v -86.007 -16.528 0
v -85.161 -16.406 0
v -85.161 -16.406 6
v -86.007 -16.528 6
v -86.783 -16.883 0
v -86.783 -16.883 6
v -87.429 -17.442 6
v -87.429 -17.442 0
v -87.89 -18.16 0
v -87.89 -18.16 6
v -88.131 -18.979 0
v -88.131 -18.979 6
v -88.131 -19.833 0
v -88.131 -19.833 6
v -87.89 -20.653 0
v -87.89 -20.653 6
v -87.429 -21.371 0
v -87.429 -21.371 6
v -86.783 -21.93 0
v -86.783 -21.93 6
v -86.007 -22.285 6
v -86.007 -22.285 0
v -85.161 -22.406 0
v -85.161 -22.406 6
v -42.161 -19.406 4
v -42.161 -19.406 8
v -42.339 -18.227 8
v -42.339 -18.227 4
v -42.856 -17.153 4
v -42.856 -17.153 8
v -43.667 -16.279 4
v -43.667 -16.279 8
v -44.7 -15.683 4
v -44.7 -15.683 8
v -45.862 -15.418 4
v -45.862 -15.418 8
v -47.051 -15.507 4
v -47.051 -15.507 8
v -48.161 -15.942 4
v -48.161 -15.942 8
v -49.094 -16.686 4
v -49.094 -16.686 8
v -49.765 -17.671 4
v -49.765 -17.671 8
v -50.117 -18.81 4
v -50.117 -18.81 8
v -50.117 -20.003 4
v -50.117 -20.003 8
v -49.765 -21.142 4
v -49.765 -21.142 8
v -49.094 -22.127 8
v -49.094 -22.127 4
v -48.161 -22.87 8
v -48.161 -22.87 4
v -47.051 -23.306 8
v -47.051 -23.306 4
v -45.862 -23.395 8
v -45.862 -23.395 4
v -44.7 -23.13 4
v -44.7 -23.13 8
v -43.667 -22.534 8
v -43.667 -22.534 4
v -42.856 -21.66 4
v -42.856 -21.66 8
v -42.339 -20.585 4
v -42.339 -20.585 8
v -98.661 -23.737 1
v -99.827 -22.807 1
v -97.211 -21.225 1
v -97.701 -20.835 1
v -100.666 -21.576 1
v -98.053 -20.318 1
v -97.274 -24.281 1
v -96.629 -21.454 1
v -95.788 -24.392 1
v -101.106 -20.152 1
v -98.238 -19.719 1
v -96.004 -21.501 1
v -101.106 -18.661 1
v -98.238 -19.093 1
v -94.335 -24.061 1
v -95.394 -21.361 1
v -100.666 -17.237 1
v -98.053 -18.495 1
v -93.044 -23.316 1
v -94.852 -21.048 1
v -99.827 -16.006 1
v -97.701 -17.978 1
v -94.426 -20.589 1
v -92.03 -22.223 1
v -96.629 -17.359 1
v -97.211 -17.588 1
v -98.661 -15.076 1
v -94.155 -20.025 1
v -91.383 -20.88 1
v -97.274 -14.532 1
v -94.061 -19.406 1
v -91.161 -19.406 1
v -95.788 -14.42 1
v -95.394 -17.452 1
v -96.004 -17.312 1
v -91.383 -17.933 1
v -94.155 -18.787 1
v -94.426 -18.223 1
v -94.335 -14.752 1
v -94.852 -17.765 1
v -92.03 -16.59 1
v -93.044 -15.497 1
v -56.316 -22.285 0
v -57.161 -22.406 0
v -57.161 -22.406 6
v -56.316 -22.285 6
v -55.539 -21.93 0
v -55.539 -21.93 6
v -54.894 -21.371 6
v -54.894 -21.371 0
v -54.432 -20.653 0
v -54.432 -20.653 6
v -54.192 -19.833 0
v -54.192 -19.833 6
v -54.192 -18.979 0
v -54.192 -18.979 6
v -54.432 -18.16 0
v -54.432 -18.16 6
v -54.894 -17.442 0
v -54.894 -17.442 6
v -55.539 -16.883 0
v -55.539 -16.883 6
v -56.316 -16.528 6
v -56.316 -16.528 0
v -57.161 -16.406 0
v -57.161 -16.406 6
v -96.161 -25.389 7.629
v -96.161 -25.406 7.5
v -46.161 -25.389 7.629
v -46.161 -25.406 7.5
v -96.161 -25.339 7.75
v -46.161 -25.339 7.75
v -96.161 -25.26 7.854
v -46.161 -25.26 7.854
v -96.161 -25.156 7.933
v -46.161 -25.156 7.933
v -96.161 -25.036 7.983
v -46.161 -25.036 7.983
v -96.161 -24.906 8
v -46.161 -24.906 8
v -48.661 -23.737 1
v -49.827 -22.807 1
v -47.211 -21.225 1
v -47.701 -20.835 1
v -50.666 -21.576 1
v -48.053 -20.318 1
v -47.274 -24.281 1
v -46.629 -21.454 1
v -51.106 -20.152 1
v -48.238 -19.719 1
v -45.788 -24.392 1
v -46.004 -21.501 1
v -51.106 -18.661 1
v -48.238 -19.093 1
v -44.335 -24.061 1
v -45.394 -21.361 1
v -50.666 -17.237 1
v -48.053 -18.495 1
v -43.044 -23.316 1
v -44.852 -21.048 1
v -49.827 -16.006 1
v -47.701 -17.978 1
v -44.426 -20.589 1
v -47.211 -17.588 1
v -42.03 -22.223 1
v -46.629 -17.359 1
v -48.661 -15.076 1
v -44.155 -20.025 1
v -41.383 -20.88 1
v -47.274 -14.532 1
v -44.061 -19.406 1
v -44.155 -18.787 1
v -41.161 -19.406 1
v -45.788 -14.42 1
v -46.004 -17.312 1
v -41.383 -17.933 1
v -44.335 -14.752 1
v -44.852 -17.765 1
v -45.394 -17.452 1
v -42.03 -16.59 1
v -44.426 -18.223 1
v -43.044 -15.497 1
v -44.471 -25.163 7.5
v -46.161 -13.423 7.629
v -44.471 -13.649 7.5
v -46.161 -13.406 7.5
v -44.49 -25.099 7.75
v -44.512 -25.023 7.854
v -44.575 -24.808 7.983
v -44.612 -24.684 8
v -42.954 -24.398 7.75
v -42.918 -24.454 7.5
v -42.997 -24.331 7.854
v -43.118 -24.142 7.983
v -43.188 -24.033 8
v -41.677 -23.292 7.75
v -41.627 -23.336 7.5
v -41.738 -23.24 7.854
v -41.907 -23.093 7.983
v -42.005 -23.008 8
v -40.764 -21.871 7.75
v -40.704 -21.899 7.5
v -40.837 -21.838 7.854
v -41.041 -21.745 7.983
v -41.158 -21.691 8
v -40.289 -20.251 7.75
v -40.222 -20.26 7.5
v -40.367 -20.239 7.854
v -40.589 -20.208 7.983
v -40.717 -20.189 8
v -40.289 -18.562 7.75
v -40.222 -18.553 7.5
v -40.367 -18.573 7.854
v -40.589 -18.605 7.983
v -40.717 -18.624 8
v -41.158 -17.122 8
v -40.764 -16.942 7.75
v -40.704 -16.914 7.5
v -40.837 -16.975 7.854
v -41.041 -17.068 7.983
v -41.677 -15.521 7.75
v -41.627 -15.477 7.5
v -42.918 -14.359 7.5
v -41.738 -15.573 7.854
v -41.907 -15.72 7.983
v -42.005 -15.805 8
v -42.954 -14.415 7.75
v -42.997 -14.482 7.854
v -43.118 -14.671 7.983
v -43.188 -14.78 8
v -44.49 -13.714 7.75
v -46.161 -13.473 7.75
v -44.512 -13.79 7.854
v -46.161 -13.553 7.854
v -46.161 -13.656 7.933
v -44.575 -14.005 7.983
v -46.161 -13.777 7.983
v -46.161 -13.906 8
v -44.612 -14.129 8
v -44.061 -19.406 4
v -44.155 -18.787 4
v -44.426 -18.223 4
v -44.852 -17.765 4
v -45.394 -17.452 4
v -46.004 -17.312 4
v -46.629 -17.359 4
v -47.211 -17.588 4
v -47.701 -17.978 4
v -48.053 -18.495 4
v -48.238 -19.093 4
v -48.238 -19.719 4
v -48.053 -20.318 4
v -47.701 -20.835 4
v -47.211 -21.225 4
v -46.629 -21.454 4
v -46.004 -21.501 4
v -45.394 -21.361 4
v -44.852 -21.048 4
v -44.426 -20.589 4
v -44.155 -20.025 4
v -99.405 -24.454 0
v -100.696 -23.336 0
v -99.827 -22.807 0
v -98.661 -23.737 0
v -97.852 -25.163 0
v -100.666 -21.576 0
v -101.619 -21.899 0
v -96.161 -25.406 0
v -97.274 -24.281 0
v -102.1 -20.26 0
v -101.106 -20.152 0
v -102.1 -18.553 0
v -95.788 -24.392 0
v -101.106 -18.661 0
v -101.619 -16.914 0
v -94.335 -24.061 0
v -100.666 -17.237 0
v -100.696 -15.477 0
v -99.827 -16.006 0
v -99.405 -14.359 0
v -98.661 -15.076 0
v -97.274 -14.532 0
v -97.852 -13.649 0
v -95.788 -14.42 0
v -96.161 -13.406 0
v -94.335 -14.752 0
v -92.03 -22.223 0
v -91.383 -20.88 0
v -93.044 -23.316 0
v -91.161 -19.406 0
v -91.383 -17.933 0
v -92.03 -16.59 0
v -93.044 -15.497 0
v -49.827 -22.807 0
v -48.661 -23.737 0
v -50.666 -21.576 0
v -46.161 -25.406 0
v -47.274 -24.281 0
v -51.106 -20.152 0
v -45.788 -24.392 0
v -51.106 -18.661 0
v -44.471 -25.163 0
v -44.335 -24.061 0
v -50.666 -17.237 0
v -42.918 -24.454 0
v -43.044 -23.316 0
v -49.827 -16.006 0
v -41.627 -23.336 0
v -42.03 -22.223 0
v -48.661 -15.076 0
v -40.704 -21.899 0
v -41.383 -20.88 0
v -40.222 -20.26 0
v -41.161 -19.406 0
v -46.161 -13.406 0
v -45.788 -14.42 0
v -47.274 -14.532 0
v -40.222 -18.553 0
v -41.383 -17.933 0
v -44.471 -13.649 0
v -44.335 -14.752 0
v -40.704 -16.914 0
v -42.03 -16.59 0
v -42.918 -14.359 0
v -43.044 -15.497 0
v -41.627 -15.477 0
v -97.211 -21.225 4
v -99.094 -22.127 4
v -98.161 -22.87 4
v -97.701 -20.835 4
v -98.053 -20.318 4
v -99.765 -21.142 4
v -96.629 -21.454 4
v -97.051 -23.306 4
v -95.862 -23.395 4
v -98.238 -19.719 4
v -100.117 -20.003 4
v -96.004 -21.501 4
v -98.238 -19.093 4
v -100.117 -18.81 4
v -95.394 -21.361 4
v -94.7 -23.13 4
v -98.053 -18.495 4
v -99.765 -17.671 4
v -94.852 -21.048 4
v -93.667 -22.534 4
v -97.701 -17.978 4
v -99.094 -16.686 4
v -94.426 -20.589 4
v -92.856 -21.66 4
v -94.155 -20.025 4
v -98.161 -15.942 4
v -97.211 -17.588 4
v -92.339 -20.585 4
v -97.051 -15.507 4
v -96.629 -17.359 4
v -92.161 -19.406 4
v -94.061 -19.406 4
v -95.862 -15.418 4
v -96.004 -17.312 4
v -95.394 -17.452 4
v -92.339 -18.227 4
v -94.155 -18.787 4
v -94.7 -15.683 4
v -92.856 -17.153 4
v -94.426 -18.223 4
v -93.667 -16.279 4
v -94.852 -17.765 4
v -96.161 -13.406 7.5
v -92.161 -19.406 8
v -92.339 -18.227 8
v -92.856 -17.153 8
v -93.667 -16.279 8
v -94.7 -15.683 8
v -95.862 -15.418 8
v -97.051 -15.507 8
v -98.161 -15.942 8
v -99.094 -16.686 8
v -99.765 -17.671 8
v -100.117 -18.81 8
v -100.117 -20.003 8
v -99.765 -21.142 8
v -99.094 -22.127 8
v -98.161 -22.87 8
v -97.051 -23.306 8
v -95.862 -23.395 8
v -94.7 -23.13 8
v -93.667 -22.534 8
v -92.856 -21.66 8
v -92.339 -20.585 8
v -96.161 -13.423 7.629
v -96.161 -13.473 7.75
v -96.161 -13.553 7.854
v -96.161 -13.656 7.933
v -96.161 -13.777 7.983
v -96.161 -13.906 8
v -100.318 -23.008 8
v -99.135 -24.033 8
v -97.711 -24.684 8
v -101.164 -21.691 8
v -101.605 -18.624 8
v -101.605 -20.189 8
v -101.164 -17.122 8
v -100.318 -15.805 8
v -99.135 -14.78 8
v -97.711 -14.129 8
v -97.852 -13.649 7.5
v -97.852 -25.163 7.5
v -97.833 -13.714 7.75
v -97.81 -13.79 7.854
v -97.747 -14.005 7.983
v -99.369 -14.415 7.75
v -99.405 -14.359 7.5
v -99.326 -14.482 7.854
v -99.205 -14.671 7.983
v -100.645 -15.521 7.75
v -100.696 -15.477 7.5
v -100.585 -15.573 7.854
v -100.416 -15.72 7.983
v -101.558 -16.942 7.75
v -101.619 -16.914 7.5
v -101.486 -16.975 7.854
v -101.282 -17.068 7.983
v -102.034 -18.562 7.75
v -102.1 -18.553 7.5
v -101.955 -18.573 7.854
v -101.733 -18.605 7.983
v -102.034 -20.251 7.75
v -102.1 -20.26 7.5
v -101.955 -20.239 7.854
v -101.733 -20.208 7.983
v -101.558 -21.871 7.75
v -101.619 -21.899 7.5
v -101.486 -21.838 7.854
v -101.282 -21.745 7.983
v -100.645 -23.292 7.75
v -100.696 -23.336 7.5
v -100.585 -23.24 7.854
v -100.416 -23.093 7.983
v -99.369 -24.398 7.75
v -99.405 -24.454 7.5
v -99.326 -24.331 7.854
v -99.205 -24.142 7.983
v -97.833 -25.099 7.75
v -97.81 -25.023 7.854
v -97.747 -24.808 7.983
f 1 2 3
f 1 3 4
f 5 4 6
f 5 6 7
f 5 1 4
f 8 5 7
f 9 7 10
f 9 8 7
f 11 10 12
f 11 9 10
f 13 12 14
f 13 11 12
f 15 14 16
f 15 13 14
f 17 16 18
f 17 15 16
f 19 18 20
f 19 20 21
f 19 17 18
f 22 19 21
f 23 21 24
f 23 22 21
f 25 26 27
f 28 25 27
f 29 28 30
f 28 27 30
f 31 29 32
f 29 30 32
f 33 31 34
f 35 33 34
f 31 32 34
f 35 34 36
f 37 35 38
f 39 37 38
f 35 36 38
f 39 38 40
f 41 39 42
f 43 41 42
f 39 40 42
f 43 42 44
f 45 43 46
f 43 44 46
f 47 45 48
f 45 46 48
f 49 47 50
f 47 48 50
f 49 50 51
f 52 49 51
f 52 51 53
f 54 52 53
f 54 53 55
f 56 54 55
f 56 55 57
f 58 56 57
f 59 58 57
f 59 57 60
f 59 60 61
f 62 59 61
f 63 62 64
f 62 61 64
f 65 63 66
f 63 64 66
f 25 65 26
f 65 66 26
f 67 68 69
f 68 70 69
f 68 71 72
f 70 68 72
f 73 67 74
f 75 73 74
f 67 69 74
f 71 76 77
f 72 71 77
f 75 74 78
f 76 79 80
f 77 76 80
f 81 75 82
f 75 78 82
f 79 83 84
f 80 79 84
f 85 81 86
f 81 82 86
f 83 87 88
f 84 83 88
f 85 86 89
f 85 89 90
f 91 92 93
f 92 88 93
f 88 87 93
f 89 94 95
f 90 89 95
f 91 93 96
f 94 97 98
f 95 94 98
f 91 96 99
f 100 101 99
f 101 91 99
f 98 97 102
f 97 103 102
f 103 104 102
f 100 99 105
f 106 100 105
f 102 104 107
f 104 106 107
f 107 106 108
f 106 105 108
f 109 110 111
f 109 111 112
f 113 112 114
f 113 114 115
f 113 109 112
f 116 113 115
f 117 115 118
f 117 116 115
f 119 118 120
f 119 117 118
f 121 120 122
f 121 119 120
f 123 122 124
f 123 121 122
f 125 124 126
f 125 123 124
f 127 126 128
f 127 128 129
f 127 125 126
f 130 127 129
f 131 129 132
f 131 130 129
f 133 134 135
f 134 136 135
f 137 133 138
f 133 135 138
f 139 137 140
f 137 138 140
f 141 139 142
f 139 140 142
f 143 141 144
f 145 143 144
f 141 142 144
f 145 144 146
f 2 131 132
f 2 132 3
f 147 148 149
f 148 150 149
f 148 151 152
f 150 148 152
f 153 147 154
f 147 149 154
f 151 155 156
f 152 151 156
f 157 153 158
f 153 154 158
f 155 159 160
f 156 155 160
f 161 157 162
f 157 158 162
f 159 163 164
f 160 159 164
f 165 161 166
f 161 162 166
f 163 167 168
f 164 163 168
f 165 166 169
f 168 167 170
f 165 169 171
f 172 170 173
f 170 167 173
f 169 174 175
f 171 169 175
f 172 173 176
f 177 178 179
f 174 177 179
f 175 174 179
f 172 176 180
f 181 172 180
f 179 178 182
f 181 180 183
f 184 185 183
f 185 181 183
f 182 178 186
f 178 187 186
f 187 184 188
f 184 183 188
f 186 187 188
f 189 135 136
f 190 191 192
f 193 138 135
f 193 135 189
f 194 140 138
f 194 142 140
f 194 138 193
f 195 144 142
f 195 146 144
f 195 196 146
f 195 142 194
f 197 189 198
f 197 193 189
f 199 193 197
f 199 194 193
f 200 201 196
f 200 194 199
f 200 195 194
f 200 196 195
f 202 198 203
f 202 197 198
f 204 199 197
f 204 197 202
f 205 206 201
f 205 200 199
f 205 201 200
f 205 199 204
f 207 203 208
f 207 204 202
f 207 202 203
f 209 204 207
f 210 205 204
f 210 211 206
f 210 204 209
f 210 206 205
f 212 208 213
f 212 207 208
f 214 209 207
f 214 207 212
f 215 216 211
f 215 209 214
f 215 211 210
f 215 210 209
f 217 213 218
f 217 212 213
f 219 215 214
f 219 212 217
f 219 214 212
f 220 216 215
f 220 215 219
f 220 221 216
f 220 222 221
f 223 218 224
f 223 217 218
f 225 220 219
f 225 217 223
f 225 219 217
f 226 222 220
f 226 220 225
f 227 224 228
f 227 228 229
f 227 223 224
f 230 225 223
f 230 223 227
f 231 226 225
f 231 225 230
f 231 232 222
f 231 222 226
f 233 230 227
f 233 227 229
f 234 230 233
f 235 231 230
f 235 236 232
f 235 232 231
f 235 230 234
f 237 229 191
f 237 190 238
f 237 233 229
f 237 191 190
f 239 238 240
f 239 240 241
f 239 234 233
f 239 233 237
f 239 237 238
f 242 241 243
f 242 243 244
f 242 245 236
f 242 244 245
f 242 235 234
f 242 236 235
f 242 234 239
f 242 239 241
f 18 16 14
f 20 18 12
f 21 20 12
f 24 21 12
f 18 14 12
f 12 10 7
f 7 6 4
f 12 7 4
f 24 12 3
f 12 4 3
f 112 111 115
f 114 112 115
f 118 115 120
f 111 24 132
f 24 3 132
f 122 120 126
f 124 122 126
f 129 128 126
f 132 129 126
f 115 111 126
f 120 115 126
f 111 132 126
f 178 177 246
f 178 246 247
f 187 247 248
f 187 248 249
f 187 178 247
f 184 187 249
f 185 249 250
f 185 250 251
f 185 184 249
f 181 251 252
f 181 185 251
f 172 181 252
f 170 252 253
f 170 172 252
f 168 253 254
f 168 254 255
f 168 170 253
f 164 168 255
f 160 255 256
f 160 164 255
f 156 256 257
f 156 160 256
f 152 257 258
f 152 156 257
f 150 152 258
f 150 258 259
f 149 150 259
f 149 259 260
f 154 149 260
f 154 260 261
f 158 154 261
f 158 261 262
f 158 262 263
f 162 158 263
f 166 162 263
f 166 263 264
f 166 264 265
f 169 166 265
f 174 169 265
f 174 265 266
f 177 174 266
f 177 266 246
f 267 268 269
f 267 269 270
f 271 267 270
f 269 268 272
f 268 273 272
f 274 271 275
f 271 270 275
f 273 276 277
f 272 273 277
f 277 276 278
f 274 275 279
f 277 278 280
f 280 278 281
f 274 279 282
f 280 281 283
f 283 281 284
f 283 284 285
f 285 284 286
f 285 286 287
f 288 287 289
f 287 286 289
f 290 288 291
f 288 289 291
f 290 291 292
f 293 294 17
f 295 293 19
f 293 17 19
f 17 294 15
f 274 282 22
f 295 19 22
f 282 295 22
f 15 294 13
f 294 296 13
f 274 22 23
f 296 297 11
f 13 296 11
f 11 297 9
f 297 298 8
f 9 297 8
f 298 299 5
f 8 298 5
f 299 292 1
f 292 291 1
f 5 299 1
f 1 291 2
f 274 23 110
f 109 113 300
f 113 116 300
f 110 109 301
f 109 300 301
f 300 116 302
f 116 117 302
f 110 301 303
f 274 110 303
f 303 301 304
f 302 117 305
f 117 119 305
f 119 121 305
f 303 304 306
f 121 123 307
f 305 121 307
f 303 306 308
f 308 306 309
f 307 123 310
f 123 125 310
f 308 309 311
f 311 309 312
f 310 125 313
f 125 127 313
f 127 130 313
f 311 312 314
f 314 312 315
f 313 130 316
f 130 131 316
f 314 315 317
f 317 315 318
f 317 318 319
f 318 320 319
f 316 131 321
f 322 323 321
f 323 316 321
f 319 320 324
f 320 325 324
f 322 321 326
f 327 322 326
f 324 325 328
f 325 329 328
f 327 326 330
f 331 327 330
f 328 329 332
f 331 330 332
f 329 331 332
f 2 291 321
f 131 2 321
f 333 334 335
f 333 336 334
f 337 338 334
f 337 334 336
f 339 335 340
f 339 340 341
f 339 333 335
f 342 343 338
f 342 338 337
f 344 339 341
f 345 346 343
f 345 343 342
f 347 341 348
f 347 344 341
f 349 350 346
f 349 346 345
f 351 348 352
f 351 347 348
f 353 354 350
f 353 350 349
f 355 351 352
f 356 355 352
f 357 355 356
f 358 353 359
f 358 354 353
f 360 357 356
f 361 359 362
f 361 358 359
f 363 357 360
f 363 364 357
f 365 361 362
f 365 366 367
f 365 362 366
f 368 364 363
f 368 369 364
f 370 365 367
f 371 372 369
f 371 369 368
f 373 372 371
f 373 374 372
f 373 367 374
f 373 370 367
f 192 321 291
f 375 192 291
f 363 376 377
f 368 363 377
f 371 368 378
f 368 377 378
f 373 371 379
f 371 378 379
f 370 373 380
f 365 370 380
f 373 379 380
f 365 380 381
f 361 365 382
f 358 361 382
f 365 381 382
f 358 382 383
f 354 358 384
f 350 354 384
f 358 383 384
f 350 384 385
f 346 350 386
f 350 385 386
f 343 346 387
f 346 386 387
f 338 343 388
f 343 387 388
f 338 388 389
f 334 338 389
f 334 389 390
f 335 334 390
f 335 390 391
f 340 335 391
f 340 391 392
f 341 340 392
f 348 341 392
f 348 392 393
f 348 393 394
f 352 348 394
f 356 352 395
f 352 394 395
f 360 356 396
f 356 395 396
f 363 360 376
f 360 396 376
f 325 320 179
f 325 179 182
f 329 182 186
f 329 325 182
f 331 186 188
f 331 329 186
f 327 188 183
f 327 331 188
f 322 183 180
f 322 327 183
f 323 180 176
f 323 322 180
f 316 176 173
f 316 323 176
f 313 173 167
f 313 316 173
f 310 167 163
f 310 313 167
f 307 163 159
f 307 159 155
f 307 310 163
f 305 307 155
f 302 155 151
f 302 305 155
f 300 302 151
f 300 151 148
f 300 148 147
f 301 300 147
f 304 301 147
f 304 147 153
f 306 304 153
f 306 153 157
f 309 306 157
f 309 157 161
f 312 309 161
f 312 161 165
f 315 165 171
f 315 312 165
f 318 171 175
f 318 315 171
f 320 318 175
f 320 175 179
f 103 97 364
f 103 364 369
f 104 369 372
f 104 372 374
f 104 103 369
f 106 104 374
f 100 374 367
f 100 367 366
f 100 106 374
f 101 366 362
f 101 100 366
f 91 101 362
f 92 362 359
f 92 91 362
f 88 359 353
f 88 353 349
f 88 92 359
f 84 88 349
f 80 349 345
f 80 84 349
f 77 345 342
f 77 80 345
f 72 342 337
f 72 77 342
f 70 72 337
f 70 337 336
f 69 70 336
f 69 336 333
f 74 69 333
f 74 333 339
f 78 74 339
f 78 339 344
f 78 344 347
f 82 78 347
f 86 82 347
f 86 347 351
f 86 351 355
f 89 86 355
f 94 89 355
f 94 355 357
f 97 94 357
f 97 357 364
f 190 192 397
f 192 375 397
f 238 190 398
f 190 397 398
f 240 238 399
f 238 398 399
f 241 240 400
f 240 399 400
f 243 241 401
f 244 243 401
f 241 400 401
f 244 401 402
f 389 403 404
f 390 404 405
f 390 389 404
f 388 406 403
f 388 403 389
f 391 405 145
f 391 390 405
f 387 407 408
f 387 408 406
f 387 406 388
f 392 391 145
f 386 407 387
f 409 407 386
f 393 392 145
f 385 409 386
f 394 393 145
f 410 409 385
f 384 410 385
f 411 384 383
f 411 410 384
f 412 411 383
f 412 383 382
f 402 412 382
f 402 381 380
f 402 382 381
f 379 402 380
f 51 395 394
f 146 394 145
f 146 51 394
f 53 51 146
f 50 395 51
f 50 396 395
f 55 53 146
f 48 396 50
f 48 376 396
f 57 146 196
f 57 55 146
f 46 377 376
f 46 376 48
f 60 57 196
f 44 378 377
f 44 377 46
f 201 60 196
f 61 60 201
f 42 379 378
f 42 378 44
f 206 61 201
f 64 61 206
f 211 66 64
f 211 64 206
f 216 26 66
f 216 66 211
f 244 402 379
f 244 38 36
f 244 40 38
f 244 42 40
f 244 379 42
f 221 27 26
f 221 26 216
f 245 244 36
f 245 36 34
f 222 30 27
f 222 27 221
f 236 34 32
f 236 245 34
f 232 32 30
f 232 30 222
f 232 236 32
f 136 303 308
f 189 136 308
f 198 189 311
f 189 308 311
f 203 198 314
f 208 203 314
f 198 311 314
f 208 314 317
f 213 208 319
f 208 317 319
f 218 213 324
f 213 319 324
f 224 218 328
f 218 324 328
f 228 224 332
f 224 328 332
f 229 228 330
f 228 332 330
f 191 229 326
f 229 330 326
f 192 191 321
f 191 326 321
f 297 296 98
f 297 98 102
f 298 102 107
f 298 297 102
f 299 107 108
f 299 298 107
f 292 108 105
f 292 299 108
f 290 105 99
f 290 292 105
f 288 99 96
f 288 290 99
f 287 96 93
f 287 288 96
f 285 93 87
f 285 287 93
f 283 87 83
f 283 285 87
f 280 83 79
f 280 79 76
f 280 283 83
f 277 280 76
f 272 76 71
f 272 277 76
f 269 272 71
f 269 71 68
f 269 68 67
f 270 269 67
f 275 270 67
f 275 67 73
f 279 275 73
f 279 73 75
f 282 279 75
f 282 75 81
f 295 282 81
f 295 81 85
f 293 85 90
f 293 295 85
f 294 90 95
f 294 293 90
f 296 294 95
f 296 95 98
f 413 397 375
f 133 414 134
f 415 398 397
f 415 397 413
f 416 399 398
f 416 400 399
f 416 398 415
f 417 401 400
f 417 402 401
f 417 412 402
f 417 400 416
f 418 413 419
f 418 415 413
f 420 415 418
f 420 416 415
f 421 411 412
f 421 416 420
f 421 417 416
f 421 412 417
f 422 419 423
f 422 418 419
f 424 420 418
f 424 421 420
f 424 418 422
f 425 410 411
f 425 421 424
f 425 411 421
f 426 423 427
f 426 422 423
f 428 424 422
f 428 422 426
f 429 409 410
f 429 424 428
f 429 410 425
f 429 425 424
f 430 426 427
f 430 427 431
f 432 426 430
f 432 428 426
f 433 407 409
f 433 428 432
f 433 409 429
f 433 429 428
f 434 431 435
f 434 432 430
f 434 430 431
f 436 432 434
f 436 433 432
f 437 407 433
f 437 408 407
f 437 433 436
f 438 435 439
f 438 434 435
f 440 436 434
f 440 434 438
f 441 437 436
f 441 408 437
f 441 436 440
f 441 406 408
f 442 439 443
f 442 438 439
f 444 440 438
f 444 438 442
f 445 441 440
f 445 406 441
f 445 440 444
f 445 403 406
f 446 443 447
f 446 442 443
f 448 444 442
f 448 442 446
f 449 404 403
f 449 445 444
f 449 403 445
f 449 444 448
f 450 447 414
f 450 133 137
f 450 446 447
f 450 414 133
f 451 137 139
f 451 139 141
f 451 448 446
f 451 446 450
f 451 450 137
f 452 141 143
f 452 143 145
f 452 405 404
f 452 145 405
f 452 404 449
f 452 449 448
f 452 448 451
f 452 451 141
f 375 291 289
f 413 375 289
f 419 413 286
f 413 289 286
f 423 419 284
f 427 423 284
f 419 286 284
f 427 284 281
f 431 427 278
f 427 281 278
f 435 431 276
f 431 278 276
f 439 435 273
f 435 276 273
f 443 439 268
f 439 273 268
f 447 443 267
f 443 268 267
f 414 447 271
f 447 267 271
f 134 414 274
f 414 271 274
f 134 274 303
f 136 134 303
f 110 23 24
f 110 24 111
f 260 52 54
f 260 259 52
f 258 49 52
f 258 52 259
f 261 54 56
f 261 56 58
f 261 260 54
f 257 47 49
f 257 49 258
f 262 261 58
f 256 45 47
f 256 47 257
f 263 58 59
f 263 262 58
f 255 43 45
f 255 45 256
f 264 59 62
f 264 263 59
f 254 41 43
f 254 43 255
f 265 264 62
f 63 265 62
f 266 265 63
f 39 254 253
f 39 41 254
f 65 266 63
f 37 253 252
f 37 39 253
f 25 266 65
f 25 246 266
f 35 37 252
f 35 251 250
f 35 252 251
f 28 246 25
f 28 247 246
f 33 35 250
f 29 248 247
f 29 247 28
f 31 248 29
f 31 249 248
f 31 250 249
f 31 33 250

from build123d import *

# Parameters (mm, degrees)
F0_R     = 5
F0_R_2   = 4
F0_R_3   = 2.1
F1_DEPTH = 8
F2_DEPTH = 25
F3_R     = 4
F3_R_2   = 2.1
F4_DEPTH = 4
F5_DEPTH = 6
F6_DEPTH = 1
F7_R     = 0.5


with BuildPart() as f1:
    # F0 (on Top) → F1 (new body)
    with BuildSketch(Plane.XY):
        with BuildLine():
            ThreePointArc((-96.161356, -13.406398), (-102.161356, -19.406398), (-96.161356, -25.406398))
            Line((-96.161356, -25.406398), (-46.161356, -25.406398))
            ThreePointArc((-46.161356, -25.406398), (-40.161356, -19.406398), (-46.161356, -13.406398))
            Line((-46.161356, -13.406398), (-96.161356, -13.406398))
        make_face()
        with BuildLine():
            Line((-96.161356, -13.906398), (-46.161356, -13.906398))
            ThreePointArc((-46.161356, -13.906398), (-40.661356, -19.406398), (-46.161356, -24.906398))
            Line((-46.161356, -24.906398), (-96.161356, -24.906398))
            ThreePointArc((-96.161356, -24.906398), (-101.661356, -19.406398), (-96.161356, -13.906398))
        make_face(mode=Mode.SUBTRACT)
        with BuildLine():
            ThreePointArc((-46.161356, -24.906398), (-40.661356, -19.406398), (-46.161356, -13.906398))
            Line((-46.161356, -13.906398), (-96.161356, -13.906398))
            ThreePointArc((-96.161356, -13.906398), (-101.661356, -19.406398), (-96.161356, -24.906398))
            Line((-96.161356, -24.906398), (-46.161356, -24.906398))
        make_face()
        with Locations((-96.161356, -19.406398)):
            Circle(F0_R, mode=Mode.SUBTRACT)
        with BuildLine():
            ThreePointArc((-85.161356, -22.406398), (-88.161356, -19.406398), (-85.161356, -16.406398))
            Line((-85.161356, -16.406398), (-57.161356, -16.406398))
            ThreePointArc((-57.161356, -16.406398), (-54.161356, -19.406398), (-57.161356, -22.406398))
            Line((-57.161356, -22.406398), (-85.161356, -22.406398))
        make_face(mode=Mode.SUBTRACT)
        with Locations((-46.161356, -19.406398)):
            Circle(F0_R, mode=Mode.SUBTRACT)
        with Locations((-96.161356, -19.406398)):
            Circle(F0_R)
        with Locations((-96.161356, -19.406398)):
            Circle(F0_R_2, mode=Mode.SUBTRACT)
        with Locations((-96.161356, -19.406398)):
            Circle(F0_R_2)
        with Locations((-96.161356, -19.406398)):
            Circle(F0_R_3, mode=Mode.SUBTRACT)
        with Locations((-96.161356, -19.406398)):
            Circle(F0_R_3)
        with BuildLine():
            Line((-57.161356, -16.406398), (-85.161356, -16.406398))
            ThreePointArc((-85.161356, -16.406398), (-88.161356, -19.406398), (-85.161356, -22.406398))
            Line((-85.161356, -22.406398), (-57.161356, -22.406398))
            ThreePointArc((-57.161356, -22.406398), (-54.161356, -19.406398), (-57.161356, -16.406398))
        make_face()
        with Locations((-46.161356, -19.406398)):
            Circle(F0_R)
        with Locations((-46.161356, -19.406398)):
            Circle(F0_R_2, mode=Mode.SUBTRACT)
        with Locations((-46.161356, -19.406398)):
            Circle(F0_R_2)
        with Locations((-46.161356, -19.406398)):
            Circle(F0_R_3, mode=Mode.SUBTRACT)
        with Locations((-46.161356, -19.406398)):
            Circle(F0_R_3)
    extrude(amount=F1_DEPTH)

    # F0 (on Top) → F2 (cut)
    with BuildSketch(Plane.XY):
        with Locations((-96.161356, -19.406398)):
            Circle(F0_R_3)
        with Locations((-46.161356, -19.406398)):
            Circle(F0_R_3)
    extrude(amount=F2_DEPTH, mode=Mode.SUBTRACT)

    # F3 (on face) → F4 (cut)
    with BuildSketch(Plane.XY.offset(8)):
        with Locations((-96.161356, -19.406398)):
            Circle(F3_R)
        with Locations((-96.161356, -19.406398)):
            Circle(F3_R_2, mode=Mode.SUBTRACT)
        with Locations((-46.161356, -19.406398)):
            Circle(F3_R)
        with Locations((-46.161356, -19.406398)):
            Circle(F3_R_2, mode=Mode.SUBTRACT)
    extrude(amount=-F4_DEPTH, mode=Mode.SUBTRACT)

    # F0 (on Top) → F5 (cut)
    with BuildSketch(Plane.XY):
        with BuildLine():
            Line((-57.161356, -16.406398), (-85.161356, -16.406398))
            ThreePointArc((-85.161356, -16.406398), (-88.161356, -19.406398), (-85.161356, -22.406398))
            Line((-85.161356, -22.406398), (-57.161356, -22.406398))
            ThreePointArc((-57.161356, -22.406398), (-54.161356, -19.406398), (-57.161356, -16.406398))
        make_face()
    extrude(amount=F5_DEPTH, mode=Mode.SUBTRACT)

    # F0 (on Top) → F6 (cut)
    with BuildSketch(Plane.XY):
        with Locations((-96.161356, -19.406398)):
            Circle(F0_R)
        with Locations((-96.161356, -19.406398)):
            Circle(F0_R_2, mode=Mode.SUBTRACT)
        with Locations((-96.161356, -19.406398)):
            Circle(F0_R_2)
        with Locations((-96.161356, -19.406398)):
            Circle(F0_R_3, mode=Mode.SUBTRACT)
        with Locations((-46.161356, -19.406398)):
            Circle(F0_R)
        with Locations((-46.161356, -19.406398)):
            Circle(F0_R_2, mode=Mode.SUBTRACT)
        with Locations((-46.161356, -19.406398)):
            Circle(F0_R_2)
        with Locations((-46.161356, -19.406398)):
            Circle(F0_R_3, mode=Mode.SUBTRACT)
    extrude(amount=F6_DEPTH, mode=Mode.SUBTRACT)

    # F7
    f7_edges = [f1.edges().sort_by_distance(p)[0] for p in [
        (-71.161356, -25.406398, 8),
    ]]
    fillet(f7_edges, radius=F7_R)


solid = f1.part
